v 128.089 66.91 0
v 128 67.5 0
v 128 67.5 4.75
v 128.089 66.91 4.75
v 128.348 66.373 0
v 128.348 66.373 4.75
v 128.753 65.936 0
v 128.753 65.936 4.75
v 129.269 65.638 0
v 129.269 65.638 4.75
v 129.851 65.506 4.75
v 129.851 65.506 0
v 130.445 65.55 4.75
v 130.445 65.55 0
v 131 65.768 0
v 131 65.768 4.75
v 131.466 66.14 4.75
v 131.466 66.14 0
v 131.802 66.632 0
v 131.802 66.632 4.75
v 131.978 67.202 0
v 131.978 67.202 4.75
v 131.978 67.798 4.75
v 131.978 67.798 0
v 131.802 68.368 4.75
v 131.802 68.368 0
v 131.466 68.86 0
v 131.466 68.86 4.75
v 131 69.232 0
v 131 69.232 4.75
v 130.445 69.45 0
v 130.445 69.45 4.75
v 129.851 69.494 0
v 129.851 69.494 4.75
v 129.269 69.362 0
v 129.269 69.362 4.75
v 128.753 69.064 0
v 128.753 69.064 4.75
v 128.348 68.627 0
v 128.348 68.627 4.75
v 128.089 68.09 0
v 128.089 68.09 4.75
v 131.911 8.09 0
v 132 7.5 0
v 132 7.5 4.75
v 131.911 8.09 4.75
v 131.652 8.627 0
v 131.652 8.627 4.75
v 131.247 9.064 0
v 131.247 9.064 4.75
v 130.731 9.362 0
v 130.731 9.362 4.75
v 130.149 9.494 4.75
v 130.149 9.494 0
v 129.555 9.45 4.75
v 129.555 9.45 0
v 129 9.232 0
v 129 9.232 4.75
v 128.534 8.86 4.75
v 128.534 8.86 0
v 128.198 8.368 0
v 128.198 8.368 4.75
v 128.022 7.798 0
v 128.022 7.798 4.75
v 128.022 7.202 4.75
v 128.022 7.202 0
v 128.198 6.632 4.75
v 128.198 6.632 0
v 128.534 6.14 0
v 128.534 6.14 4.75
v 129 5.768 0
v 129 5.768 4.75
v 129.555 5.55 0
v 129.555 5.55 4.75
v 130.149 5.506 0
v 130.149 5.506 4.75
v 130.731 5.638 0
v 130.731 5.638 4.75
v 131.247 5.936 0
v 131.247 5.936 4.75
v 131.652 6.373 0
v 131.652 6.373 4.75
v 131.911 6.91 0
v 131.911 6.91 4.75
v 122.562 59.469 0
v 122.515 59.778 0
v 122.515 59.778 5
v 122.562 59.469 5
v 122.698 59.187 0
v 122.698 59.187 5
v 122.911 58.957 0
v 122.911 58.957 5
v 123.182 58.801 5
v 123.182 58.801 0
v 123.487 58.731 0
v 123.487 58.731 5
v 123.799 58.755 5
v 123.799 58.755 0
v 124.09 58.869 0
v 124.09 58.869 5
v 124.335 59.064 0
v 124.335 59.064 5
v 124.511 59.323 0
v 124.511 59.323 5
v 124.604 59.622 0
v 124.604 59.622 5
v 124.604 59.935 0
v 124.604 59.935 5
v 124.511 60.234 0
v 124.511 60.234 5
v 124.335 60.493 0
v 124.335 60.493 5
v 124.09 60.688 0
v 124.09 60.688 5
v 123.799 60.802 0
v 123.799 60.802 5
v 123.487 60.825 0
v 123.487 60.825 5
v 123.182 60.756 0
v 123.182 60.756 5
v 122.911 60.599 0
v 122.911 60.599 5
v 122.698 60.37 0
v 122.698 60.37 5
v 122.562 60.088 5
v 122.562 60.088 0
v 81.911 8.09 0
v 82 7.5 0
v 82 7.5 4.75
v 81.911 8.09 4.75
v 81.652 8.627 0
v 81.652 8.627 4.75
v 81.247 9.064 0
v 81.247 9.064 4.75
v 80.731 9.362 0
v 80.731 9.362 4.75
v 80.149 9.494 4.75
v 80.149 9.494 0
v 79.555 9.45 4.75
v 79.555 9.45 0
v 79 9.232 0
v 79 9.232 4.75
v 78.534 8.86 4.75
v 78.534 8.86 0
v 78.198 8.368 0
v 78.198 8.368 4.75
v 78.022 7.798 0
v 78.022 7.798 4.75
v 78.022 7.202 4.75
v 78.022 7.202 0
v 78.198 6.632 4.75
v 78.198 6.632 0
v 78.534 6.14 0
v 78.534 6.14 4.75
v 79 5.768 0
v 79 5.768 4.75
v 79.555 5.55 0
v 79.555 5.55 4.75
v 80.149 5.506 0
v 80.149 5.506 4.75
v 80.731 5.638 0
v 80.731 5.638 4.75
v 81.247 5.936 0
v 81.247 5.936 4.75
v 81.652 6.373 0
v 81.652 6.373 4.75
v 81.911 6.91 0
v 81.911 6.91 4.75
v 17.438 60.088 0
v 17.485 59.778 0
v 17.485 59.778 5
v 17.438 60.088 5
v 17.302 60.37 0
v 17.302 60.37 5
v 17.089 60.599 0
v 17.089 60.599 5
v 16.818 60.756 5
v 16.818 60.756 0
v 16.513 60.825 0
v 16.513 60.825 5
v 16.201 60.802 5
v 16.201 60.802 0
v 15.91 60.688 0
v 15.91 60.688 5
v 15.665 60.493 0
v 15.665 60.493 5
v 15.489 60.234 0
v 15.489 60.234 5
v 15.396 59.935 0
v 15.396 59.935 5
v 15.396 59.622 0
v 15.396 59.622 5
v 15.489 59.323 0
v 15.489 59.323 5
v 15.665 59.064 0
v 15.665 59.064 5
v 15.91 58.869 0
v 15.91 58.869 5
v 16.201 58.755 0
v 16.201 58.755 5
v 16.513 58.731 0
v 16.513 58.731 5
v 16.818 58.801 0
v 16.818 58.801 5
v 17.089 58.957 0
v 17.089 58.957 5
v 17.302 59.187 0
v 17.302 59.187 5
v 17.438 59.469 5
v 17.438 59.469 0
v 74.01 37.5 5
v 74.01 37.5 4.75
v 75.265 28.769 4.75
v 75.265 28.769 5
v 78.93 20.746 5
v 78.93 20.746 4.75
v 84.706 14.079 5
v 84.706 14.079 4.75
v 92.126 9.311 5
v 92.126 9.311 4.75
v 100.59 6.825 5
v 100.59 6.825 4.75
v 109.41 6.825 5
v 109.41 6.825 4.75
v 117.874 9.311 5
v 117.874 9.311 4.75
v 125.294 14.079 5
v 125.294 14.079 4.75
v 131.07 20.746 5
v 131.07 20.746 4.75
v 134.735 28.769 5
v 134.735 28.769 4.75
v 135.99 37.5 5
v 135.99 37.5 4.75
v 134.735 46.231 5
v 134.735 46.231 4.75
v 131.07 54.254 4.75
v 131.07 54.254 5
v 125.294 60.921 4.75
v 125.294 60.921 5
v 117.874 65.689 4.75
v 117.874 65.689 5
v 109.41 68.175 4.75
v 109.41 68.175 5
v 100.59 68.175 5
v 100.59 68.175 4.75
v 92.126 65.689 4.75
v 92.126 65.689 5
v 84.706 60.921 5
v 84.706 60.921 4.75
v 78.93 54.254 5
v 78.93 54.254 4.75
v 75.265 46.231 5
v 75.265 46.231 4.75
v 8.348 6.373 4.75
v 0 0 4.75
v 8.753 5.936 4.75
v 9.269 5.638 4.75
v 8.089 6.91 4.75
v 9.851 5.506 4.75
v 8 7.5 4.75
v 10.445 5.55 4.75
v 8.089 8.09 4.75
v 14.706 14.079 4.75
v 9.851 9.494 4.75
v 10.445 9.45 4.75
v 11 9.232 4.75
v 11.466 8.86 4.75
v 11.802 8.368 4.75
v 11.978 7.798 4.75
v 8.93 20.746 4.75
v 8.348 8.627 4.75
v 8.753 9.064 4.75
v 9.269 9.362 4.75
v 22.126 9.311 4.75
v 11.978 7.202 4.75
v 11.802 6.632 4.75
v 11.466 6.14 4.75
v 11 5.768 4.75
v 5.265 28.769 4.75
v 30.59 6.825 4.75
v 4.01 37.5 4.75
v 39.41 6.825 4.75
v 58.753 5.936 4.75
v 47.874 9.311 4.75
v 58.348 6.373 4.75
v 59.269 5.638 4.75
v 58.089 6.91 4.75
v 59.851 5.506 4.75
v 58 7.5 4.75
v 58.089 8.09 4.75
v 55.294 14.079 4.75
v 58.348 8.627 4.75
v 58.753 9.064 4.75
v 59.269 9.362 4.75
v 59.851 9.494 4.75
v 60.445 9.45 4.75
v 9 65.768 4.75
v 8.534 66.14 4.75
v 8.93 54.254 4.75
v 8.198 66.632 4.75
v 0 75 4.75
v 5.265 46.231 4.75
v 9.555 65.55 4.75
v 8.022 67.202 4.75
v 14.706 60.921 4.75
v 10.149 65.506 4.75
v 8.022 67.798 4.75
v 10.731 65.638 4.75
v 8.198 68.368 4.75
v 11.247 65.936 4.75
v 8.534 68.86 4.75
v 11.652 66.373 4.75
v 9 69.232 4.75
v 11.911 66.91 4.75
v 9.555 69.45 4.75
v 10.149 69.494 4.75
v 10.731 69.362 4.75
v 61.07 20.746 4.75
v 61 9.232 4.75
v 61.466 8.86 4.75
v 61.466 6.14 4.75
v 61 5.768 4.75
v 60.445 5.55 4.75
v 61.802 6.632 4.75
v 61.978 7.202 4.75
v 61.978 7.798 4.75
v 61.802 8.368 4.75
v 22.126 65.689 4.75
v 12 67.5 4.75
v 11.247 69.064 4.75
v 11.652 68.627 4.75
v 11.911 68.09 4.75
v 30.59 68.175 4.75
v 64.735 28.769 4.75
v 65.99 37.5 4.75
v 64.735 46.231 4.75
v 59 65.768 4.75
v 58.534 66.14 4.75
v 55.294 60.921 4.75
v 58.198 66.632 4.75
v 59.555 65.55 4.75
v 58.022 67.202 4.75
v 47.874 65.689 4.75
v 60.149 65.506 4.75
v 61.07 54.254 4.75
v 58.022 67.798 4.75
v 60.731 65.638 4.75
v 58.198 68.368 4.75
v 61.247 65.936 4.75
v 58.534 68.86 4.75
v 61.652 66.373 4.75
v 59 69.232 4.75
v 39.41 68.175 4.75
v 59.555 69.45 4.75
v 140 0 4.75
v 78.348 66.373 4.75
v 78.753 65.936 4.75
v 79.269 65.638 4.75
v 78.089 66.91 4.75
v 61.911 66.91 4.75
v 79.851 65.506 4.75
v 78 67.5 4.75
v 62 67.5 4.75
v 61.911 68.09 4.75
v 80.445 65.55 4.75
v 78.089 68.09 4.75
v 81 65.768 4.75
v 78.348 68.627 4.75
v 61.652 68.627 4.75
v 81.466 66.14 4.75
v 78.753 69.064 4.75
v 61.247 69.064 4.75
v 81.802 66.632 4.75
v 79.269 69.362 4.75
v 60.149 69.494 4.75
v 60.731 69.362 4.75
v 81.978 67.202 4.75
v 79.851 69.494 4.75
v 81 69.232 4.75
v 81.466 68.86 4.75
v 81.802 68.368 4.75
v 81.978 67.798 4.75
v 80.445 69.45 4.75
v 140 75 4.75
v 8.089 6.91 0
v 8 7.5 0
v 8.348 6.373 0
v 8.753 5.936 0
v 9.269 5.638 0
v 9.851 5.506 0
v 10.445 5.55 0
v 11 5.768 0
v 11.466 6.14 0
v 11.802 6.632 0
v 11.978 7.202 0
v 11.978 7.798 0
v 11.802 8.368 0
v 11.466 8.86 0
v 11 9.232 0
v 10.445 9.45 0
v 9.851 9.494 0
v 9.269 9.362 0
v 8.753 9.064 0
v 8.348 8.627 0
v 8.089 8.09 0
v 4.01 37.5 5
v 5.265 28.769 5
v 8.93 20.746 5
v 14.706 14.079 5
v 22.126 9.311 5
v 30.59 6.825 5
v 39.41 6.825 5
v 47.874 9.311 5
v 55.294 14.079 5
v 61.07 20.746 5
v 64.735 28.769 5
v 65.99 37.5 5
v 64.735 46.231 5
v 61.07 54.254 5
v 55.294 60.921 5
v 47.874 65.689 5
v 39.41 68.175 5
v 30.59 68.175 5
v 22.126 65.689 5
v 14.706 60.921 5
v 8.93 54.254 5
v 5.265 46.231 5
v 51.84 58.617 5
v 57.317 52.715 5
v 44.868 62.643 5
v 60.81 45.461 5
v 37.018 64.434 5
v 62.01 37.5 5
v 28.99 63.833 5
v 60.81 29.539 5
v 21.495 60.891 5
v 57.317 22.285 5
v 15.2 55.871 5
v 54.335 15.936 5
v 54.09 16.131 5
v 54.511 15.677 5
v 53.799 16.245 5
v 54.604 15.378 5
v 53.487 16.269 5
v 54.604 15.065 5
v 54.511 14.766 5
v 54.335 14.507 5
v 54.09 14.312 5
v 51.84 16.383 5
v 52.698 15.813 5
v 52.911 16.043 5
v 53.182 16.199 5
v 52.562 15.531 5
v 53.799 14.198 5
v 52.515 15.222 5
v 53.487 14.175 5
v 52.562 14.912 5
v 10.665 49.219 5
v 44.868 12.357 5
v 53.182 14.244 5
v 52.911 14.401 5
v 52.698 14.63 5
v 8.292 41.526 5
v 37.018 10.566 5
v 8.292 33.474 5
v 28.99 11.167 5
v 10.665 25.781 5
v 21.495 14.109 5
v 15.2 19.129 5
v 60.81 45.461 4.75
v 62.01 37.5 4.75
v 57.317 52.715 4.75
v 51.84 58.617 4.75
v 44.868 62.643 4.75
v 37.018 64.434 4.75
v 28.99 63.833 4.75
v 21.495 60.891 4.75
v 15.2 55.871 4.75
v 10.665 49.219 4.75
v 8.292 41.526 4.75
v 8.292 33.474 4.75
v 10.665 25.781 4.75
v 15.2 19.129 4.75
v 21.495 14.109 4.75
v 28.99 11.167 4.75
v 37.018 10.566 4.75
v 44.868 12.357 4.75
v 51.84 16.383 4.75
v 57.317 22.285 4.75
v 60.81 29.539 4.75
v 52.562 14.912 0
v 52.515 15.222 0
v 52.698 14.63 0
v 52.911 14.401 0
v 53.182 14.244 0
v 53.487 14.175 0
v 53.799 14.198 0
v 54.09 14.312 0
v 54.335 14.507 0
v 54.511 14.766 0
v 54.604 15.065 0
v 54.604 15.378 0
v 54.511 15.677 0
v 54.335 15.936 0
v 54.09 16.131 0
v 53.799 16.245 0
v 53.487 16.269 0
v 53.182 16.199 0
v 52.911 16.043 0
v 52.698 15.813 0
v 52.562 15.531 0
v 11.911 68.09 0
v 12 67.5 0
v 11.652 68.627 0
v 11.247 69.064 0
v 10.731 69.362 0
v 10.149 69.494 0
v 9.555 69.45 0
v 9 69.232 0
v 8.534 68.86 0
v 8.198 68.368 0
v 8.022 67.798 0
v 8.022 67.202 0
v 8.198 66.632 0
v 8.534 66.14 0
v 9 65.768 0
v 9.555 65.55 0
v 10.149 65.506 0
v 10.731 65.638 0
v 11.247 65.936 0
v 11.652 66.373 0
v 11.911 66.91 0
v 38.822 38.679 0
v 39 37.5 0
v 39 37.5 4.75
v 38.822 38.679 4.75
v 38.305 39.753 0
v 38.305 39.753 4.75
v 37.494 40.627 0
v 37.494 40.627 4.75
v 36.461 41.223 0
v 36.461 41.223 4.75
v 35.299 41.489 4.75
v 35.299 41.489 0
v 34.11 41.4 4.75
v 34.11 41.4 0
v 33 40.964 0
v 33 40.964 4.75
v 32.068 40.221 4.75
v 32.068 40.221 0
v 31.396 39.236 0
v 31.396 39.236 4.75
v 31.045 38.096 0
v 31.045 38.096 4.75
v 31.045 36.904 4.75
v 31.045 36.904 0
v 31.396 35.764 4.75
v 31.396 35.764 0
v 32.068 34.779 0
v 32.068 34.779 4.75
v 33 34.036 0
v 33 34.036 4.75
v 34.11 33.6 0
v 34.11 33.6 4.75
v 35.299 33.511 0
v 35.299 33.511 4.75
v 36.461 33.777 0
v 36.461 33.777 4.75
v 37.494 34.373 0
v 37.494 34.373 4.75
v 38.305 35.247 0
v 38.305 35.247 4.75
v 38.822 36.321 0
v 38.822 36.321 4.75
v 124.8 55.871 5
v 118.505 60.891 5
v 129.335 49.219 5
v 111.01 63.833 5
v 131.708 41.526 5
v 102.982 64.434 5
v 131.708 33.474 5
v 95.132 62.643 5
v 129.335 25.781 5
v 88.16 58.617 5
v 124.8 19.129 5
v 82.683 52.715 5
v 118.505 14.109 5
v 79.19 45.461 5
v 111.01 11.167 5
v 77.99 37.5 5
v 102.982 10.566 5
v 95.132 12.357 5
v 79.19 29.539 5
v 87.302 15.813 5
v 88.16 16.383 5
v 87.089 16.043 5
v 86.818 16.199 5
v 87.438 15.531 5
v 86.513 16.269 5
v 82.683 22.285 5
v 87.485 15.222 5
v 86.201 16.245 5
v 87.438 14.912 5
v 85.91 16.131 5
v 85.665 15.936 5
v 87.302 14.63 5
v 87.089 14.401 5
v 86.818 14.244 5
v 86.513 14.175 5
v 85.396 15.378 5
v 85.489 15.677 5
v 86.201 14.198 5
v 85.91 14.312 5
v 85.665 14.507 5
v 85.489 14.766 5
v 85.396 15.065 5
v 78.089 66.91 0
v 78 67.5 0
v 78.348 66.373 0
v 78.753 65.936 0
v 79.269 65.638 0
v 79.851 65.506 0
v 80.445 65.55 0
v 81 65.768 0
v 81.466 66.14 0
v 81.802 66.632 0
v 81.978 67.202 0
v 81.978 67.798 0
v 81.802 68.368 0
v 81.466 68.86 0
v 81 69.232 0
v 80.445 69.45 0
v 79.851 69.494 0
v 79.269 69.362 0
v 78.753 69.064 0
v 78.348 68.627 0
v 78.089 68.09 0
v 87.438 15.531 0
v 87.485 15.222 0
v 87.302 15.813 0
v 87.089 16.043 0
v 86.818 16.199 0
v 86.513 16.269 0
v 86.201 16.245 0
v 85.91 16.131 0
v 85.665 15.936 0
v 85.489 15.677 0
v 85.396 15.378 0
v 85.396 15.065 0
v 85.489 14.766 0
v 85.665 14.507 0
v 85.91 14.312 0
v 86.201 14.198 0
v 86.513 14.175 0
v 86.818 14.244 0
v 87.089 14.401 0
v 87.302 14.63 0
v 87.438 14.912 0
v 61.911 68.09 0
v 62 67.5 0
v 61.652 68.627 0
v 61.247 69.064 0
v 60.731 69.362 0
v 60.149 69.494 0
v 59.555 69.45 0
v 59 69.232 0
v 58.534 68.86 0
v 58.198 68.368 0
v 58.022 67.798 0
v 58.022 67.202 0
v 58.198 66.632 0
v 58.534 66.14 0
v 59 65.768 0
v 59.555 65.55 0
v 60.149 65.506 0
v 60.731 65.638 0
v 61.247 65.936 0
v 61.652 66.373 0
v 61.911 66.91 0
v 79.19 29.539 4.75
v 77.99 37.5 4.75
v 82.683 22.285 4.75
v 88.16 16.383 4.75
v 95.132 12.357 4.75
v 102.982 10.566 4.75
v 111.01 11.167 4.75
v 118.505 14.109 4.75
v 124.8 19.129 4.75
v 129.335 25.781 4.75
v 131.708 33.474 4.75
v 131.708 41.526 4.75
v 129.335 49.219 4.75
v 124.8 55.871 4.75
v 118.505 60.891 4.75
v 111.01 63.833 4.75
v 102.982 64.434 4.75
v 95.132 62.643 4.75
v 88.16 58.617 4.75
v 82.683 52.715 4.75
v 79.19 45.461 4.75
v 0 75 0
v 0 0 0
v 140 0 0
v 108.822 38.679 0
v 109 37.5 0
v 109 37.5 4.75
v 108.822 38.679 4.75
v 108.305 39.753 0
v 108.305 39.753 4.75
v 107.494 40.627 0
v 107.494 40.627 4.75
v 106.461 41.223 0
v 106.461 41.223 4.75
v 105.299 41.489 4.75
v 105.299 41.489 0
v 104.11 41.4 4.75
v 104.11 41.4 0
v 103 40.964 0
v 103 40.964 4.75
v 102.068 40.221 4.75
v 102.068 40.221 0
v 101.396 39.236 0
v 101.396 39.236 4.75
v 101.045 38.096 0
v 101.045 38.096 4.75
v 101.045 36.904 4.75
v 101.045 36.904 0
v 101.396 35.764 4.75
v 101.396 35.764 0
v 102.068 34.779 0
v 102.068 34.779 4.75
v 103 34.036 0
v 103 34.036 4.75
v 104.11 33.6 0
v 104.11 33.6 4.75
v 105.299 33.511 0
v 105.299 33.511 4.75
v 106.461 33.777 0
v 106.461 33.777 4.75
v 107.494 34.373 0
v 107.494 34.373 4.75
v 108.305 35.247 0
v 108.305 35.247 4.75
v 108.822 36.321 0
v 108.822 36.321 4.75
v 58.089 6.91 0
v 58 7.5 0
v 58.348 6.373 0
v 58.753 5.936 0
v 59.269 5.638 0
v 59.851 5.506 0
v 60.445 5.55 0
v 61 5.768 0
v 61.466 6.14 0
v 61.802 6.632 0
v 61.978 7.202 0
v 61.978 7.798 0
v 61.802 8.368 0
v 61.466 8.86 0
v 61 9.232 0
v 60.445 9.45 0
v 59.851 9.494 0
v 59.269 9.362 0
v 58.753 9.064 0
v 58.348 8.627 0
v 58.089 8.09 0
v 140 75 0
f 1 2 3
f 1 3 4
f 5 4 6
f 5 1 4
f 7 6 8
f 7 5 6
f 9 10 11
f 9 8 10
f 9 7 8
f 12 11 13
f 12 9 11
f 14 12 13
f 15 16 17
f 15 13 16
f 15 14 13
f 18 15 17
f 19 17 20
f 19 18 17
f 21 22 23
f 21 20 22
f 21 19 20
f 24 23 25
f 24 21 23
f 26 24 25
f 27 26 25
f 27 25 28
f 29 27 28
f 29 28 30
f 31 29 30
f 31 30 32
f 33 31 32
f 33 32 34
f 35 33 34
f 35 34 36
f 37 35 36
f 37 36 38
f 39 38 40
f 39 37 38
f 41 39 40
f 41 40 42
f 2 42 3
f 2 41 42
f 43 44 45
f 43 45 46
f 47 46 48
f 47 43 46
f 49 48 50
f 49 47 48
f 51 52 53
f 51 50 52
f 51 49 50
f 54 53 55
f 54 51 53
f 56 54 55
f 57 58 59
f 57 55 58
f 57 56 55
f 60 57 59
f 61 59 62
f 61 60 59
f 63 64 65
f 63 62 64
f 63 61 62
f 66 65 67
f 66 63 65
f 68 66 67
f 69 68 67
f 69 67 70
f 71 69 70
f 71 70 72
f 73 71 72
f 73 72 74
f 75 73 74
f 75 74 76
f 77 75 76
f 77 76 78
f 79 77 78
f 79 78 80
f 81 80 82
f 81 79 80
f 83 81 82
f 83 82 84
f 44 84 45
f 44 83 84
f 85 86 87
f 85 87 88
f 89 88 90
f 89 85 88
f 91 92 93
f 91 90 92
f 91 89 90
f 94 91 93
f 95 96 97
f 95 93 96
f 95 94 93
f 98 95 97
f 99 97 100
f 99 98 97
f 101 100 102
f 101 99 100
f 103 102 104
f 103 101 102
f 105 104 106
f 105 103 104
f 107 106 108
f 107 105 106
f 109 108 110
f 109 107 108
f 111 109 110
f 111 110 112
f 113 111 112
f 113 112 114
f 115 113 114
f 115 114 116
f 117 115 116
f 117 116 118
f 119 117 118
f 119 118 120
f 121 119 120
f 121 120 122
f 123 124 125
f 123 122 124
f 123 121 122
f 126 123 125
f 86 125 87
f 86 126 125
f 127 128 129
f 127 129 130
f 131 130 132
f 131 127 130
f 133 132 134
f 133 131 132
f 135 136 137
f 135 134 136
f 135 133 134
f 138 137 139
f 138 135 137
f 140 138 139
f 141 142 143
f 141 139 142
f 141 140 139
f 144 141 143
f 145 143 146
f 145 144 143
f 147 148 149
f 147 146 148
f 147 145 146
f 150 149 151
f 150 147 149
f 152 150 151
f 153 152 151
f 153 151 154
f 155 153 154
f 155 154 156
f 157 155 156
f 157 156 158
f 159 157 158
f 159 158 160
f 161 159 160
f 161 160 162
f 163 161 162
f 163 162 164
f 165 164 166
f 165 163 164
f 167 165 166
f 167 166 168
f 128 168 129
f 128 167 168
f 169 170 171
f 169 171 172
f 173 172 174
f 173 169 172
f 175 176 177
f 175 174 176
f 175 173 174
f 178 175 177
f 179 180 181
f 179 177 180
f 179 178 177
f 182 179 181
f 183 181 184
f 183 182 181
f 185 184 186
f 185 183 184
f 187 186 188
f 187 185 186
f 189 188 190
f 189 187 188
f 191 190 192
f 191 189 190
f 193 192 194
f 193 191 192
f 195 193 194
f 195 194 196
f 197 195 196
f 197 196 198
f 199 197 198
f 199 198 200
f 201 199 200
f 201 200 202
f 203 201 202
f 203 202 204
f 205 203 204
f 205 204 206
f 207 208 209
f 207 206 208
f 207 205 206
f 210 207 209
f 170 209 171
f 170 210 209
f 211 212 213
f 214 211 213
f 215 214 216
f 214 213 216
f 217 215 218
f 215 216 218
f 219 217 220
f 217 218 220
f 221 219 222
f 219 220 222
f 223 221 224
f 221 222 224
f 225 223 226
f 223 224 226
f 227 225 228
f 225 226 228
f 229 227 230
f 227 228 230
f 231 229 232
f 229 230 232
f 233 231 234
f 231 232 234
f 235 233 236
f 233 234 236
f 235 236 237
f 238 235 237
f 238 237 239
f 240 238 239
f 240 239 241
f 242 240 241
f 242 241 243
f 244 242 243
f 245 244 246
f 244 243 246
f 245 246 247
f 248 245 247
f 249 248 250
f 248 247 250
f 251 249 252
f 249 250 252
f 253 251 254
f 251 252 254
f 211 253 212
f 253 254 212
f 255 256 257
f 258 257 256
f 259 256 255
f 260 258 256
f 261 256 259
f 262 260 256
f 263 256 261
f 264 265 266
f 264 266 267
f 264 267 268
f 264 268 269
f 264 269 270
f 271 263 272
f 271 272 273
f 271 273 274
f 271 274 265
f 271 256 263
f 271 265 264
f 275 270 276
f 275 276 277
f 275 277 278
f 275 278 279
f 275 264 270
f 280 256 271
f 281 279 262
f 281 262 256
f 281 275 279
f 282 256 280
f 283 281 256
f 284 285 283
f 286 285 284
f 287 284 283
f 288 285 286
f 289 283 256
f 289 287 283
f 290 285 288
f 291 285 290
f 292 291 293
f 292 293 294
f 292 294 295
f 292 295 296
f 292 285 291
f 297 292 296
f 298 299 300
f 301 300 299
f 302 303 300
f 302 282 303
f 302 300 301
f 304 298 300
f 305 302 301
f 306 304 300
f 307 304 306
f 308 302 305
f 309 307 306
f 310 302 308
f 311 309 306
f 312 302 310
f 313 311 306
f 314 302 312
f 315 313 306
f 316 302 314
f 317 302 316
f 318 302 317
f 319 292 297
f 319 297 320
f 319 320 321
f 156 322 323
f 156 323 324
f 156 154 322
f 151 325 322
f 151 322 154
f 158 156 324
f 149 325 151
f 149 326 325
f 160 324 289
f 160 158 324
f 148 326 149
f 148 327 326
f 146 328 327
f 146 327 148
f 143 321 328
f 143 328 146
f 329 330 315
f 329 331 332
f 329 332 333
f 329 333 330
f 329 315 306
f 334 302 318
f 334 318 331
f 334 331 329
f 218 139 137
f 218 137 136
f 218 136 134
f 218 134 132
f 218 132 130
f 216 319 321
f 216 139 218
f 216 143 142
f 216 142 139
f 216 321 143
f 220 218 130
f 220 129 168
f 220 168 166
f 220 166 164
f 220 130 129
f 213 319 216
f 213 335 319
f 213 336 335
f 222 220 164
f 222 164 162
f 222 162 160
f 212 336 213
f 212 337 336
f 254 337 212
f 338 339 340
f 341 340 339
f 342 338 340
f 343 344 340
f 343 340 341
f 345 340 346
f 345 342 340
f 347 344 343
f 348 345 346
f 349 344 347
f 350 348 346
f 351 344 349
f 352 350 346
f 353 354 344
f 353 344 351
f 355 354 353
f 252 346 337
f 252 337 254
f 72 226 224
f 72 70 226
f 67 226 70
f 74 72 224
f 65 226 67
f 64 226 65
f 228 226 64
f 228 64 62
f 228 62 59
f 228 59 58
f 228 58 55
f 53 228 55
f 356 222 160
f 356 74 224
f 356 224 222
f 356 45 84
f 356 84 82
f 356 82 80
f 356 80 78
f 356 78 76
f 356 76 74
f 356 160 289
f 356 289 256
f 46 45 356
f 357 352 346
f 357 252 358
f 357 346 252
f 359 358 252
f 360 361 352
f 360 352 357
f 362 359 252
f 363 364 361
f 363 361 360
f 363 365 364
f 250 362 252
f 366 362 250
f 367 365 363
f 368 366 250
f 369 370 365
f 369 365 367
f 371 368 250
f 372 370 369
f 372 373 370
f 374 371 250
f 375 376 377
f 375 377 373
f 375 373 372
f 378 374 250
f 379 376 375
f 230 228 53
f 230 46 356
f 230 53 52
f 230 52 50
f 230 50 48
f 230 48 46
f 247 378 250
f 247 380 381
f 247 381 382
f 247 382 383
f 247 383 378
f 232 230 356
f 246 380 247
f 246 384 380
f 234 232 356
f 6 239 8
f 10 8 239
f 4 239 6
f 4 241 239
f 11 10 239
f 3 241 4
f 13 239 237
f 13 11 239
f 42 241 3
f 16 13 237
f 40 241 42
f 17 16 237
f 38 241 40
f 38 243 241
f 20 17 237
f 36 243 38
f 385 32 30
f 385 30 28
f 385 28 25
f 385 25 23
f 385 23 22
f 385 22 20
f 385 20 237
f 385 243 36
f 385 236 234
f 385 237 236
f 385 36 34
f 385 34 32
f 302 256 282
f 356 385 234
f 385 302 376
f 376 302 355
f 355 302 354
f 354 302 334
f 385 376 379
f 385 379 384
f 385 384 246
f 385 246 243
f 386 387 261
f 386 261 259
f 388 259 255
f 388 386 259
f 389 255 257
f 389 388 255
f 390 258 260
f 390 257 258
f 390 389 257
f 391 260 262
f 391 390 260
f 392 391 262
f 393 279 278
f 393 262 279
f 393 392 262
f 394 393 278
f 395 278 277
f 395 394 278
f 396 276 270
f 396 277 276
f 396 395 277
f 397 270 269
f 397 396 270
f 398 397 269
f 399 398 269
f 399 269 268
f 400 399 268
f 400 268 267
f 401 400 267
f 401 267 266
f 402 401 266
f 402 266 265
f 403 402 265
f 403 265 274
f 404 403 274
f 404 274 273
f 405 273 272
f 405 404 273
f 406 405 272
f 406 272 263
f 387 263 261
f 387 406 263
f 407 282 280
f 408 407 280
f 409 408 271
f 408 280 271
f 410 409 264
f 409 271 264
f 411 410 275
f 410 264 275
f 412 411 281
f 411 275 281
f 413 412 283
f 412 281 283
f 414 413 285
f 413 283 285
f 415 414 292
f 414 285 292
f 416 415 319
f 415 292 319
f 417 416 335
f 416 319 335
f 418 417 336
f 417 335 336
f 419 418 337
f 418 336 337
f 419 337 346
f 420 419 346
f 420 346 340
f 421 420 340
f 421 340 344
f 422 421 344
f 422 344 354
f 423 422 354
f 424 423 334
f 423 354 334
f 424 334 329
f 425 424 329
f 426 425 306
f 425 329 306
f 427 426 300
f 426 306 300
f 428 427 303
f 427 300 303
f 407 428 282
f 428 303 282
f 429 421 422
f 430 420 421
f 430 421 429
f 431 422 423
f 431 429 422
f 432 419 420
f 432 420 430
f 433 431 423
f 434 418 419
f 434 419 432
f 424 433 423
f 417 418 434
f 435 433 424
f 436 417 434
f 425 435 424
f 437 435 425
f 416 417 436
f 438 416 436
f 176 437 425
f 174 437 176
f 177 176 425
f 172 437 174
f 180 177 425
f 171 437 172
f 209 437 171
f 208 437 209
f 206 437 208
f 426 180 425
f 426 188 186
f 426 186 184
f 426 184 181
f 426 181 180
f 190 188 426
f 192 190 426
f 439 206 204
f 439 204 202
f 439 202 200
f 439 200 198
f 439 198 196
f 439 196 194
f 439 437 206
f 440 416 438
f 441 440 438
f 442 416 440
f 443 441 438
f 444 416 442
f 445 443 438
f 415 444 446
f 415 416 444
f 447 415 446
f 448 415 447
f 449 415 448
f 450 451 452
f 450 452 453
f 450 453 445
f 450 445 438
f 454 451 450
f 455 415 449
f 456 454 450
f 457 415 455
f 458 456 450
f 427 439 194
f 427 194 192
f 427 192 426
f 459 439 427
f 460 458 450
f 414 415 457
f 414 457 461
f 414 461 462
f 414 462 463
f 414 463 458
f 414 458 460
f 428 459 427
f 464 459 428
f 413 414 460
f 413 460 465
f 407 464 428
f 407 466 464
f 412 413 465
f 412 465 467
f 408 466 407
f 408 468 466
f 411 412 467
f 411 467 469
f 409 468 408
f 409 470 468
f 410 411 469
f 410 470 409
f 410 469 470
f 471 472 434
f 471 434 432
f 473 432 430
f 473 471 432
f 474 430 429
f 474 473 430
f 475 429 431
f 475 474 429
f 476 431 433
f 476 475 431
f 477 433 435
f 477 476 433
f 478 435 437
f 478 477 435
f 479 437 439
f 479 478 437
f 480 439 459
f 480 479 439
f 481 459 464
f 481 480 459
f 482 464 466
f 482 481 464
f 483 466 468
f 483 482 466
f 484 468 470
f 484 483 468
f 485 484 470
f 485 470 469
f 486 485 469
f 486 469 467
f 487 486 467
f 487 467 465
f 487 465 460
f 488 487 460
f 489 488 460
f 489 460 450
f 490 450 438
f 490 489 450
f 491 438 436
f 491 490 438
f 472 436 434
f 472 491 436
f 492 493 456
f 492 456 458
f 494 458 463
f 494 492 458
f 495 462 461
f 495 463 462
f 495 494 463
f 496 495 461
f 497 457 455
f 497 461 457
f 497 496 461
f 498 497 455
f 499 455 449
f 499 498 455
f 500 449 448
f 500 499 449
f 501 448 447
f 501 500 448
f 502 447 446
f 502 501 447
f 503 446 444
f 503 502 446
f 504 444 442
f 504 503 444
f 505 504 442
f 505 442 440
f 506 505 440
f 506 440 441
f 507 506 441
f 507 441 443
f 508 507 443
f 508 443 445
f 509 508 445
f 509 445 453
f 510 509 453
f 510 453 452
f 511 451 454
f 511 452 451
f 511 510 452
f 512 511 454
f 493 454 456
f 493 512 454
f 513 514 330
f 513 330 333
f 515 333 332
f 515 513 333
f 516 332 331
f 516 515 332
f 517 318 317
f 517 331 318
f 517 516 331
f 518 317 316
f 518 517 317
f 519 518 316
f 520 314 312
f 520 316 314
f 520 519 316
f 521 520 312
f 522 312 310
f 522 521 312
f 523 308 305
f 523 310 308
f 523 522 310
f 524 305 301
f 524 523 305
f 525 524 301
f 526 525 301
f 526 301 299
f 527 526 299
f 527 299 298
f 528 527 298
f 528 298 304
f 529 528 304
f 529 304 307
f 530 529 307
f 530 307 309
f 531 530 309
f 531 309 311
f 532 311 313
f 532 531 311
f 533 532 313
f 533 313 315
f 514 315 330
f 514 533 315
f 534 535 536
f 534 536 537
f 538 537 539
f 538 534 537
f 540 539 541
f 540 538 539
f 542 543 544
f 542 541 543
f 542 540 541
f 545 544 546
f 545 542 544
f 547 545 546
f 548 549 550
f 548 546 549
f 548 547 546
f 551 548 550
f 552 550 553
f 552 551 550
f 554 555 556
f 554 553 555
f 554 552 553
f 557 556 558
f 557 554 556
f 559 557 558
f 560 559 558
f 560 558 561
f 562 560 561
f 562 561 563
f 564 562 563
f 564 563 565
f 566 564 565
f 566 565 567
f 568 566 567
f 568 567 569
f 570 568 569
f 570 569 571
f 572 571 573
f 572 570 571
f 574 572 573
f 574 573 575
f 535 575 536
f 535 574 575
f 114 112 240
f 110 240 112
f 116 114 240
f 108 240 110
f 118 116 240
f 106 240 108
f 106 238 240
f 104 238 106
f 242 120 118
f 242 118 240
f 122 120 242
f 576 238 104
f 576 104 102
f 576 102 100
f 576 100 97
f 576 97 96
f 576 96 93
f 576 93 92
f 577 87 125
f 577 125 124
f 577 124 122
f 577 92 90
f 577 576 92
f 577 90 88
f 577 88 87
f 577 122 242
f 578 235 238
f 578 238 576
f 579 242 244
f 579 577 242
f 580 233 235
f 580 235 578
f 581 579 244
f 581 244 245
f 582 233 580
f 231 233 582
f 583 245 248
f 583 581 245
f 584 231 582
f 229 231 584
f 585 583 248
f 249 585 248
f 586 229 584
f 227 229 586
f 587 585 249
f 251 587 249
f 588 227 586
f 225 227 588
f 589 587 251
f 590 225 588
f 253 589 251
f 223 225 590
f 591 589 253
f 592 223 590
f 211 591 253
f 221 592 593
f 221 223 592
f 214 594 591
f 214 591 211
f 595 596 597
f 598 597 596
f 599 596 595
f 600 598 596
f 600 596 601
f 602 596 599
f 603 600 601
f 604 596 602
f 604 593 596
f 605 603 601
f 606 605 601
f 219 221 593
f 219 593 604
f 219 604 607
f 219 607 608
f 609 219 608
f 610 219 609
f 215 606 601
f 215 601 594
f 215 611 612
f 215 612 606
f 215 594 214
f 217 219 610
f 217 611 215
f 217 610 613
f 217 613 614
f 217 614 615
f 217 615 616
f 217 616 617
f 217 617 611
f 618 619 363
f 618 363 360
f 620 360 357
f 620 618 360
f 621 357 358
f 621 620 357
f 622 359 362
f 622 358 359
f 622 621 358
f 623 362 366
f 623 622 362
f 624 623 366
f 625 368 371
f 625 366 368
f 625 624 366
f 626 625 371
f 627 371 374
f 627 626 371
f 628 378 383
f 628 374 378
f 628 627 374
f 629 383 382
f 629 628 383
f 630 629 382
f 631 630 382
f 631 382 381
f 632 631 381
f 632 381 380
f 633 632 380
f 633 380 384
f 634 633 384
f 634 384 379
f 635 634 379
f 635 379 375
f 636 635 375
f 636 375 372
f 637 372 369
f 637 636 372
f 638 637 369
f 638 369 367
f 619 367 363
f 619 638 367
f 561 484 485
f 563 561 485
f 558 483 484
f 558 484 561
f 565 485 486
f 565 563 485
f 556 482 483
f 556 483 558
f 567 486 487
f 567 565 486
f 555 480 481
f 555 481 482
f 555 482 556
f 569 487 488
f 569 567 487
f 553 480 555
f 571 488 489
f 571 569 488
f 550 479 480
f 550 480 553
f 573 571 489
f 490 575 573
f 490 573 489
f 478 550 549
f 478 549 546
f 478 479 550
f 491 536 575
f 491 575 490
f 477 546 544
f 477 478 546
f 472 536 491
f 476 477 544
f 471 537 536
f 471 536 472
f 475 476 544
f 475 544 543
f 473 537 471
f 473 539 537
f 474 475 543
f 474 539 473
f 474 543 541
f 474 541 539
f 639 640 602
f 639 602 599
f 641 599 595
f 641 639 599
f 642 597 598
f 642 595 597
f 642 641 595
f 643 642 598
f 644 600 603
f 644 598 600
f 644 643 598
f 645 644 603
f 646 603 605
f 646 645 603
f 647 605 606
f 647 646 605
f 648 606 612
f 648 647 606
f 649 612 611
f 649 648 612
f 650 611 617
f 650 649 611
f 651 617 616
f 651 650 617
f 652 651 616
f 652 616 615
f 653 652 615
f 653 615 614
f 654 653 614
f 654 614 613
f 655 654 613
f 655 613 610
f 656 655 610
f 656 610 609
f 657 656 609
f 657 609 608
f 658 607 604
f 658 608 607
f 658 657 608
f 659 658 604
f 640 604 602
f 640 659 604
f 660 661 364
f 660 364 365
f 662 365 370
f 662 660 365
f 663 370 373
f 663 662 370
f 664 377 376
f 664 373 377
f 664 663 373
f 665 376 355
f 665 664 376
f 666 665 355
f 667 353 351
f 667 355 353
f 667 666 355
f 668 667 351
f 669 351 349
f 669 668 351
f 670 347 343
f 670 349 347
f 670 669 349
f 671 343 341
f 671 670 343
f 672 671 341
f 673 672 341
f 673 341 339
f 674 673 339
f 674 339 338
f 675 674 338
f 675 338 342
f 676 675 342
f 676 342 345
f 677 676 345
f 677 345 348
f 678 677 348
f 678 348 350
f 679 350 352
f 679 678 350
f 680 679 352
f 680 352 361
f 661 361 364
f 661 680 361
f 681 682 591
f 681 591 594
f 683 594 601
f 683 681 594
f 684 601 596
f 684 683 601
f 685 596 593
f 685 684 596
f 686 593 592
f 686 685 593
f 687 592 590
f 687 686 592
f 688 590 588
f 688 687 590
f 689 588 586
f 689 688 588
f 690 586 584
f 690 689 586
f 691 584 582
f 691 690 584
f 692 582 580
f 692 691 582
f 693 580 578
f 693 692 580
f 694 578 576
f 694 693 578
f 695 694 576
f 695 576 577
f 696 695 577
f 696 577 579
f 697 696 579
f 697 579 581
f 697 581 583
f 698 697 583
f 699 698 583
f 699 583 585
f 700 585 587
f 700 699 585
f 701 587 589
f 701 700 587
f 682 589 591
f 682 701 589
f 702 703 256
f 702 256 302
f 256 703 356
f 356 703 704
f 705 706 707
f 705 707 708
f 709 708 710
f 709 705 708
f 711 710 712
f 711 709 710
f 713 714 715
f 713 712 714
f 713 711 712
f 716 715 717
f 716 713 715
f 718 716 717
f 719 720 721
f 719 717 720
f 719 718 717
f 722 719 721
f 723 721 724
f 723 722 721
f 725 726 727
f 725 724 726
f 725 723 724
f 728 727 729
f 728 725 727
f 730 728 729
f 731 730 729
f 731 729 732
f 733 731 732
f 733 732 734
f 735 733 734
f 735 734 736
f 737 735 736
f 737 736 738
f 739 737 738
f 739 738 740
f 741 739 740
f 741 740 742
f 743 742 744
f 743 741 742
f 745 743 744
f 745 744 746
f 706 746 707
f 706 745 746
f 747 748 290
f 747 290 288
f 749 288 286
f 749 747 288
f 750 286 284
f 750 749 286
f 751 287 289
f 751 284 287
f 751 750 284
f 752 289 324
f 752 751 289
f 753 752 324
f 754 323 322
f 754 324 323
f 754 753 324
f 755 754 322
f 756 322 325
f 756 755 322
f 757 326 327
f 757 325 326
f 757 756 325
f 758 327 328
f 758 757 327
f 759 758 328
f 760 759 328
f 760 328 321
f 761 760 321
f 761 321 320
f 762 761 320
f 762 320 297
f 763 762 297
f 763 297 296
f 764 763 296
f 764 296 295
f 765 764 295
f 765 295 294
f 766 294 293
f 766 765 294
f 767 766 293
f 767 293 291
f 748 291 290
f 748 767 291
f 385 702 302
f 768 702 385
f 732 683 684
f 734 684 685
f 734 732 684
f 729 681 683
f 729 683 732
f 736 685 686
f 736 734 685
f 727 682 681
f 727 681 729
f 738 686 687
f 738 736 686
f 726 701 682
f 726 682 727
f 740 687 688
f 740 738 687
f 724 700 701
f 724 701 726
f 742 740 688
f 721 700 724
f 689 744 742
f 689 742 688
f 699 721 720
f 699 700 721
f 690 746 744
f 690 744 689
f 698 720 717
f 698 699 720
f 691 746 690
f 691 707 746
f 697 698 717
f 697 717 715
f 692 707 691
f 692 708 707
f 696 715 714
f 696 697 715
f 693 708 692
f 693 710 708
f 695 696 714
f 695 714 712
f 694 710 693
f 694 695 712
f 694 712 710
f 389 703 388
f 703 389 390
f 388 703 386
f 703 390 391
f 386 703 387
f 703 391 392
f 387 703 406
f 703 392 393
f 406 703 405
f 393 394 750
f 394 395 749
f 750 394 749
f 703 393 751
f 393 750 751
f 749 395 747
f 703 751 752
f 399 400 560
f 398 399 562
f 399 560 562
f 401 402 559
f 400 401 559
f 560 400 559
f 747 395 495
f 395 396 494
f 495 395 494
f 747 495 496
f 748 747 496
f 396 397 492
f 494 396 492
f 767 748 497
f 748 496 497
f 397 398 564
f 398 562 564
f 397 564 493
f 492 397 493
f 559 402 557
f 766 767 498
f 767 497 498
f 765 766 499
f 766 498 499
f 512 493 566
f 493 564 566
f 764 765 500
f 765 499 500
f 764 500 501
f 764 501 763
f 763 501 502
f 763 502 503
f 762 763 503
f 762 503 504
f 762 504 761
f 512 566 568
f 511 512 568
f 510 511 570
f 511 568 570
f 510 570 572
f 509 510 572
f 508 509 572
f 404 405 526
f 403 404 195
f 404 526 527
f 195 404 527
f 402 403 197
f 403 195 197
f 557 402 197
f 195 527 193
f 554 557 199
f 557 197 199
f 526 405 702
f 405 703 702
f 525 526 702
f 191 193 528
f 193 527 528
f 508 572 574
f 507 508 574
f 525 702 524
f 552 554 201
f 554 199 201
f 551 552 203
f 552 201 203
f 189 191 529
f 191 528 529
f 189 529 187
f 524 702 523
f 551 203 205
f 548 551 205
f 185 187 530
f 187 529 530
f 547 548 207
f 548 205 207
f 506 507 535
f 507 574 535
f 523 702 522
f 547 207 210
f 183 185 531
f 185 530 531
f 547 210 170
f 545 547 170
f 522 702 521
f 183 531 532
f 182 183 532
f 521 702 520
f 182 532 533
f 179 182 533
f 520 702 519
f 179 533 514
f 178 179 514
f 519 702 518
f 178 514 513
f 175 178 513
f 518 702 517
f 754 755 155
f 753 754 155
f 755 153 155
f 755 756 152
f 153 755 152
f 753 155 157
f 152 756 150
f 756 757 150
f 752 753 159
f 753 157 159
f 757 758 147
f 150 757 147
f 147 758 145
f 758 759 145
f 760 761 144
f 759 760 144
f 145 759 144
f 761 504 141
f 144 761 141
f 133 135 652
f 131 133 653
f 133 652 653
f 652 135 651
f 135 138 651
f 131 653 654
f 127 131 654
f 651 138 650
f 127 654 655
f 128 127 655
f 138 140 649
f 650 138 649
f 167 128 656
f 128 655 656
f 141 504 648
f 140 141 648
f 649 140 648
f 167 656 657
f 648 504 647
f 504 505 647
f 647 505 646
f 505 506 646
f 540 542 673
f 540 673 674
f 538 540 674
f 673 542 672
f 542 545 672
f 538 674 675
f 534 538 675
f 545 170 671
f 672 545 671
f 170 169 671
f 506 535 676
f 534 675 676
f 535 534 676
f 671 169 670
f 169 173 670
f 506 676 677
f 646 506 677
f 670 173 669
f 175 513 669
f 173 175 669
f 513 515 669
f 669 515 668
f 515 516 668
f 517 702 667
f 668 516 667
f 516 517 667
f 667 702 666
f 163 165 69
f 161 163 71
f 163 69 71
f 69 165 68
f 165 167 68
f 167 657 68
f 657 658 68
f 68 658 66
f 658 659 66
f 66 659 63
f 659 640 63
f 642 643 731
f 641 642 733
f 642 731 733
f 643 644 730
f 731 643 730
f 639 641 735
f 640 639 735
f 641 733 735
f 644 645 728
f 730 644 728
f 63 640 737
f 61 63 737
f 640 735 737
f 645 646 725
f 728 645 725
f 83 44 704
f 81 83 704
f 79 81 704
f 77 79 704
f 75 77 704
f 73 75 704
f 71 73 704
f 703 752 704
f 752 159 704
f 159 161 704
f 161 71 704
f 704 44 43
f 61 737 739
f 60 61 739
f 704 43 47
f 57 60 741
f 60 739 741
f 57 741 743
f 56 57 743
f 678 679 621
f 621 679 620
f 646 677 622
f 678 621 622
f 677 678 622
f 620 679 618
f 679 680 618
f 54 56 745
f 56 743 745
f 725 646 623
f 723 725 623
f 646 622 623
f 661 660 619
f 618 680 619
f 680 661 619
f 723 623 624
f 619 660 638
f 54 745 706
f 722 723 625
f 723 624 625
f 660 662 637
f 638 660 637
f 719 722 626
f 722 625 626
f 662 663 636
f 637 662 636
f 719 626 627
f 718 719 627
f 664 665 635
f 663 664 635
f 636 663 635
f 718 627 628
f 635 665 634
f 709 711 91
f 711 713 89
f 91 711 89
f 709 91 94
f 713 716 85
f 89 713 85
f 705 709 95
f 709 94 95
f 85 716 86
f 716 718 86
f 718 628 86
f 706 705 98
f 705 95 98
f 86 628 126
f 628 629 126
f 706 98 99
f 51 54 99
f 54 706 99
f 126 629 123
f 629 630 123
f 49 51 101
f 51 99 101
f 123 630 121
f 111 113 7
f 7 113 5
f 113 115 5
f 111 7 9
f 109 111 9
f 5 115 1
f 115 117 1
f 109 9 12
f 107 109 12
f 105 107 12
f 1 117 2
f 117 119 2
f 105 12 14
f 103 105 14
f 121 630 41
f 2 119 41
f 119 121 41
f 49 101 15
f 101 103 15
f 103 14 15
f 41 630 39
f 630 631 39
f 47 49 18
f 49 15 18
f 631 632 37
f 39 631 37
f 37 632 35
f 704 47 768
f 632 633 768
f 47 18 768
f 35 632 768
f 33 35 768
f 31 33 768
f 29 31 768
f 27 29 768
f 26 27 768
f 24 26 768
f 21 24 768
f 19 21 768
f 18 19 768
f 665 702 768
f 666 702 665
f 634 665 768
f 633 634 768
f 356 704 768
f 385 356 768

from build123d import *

# Parameters (mm, degrees)
ESQUISSE1_W                  = 140
ESQUISSE1_H                  = 75
BOSS_EXTRU_1_DEPTH           = 4.75
ESQUISSE2_R                  = 30.99
ESQUISSE2_R_2                = 27.01
BOSS_EXTRU_2_DEPTH           = 0.25
ENL_V_MAT_EXTRU_1_DEPTH      = 159.894815837
ENL_V_MAT_EXTRU_1_DEPTH_BACK = 159.894815837
ESQUISSE3_R                  = 2
ESQUISSE3_R_2                = 4
ESQUISSE3_R_3                = 1.05


with BuildPart() as part:
    # Esquisse1 → Boss.-Extru.1 (new body)
    with BuildSketch(Plane.XY):
        with Locations((70, 37.5)):
            Rectangle(ESQUISSE1_W, ESQUISSE1_H)
    extrude(amount=BOSS_EXTRU_1_DEPTH)

    # Esquisse2 → Boss.-Extru.2 (add)
    # profile 1 of 2: a face of its own
    with BuildSketch(Plane.XY.offset(4.75)):
        with Locations(Location((35, 37.5, 0), (0, 0, 180))):
            Circle(ESQUISSE2_R)
        with Locations((35, 37.5)):
            Circle(ESQUISSE2_R_2, mode=Mode.SUBTRACT)
    # profile 2 of 2: a face of its own
    with BuildSketch(Plane.XY.offset(4.75)):
        with Locations(Location((105, 37.5, 0), (0, 0, 180))):
            Circle(ESQUISSE2_R)
        with Locations(Location((105, 37.5, 0), (0, 0, 180))):
            Circle(ESQUISSE2_R_2, mode=Mode.SUBTRACT)
    extrude(amount=BOSS_EXTRU_2_DEPTH)

    # Esquisse3 → Enlèv. mat.-Extru.1 (cut, two sides: drawn at the far end of the back side and taken through both)
    with BuildSketch(Plane.XY.offset(4.75).offset(-ENL_V_MAT_EXTRU_1_DEPTH_BACK)):
        with Locations((10, 67.5)):
            Circle(ESQUISSE3_R)
        with Locations((60, 67.5)):
            Circle(ESQUISSE3_R)
        with Locations(Location((60, 7.5, 0), (0, 0, 180))):
            Circle(ESQUISSE3_R)
        with Locations(Location((10, 7.5, 0), (0, 0, 180))):
            Circle(ESQUISSE3_R)
        with Locations((130, 7.5)):
            Circle(ESQUISSE3_R)
        with Locations((80, 7.5)):
            Circle(ESQUISSE3_R)
        with Locations(Location((80, 67.5, 0), (0, 0, 180))):
            Circle(ESQUISSE3_R)
        with Locations(Location((130, 67.5, 0), (0, 0, 180))):
            Circle(ESQUISSE3_R)
        with Locations((35, 37.5)):
            Circle(ESQUISSE3_R_2)
        with Locations((105, 37.5)):
            Circle(ESQUISSE3_R_2)
        with Locations((16.43465241, 59.778417108)):
            Circle(ESQUISSE3_R_3)
        with Locations(Location((53.56534759, 15.221582892, 0), (0, 0, 180))):
            Circle(ESQUISSE3_R_3)
        with Locations(Location((123.56534759, 59.778417108, 0), (0, 0, 180))):
            Circle(ESQUISSE3_R_3)
        with Locations((86.43465241, 15.221582892)):
            Circle(ESQUISSE3_R_3)
    extrude(amount=ENL_V_MAT_EXTRU_1_DEPTH + ENL_V_MAT_EXTRU_1_DEPTH_BACK, mode=Mode.SUBTRACT)


solid = part.part
